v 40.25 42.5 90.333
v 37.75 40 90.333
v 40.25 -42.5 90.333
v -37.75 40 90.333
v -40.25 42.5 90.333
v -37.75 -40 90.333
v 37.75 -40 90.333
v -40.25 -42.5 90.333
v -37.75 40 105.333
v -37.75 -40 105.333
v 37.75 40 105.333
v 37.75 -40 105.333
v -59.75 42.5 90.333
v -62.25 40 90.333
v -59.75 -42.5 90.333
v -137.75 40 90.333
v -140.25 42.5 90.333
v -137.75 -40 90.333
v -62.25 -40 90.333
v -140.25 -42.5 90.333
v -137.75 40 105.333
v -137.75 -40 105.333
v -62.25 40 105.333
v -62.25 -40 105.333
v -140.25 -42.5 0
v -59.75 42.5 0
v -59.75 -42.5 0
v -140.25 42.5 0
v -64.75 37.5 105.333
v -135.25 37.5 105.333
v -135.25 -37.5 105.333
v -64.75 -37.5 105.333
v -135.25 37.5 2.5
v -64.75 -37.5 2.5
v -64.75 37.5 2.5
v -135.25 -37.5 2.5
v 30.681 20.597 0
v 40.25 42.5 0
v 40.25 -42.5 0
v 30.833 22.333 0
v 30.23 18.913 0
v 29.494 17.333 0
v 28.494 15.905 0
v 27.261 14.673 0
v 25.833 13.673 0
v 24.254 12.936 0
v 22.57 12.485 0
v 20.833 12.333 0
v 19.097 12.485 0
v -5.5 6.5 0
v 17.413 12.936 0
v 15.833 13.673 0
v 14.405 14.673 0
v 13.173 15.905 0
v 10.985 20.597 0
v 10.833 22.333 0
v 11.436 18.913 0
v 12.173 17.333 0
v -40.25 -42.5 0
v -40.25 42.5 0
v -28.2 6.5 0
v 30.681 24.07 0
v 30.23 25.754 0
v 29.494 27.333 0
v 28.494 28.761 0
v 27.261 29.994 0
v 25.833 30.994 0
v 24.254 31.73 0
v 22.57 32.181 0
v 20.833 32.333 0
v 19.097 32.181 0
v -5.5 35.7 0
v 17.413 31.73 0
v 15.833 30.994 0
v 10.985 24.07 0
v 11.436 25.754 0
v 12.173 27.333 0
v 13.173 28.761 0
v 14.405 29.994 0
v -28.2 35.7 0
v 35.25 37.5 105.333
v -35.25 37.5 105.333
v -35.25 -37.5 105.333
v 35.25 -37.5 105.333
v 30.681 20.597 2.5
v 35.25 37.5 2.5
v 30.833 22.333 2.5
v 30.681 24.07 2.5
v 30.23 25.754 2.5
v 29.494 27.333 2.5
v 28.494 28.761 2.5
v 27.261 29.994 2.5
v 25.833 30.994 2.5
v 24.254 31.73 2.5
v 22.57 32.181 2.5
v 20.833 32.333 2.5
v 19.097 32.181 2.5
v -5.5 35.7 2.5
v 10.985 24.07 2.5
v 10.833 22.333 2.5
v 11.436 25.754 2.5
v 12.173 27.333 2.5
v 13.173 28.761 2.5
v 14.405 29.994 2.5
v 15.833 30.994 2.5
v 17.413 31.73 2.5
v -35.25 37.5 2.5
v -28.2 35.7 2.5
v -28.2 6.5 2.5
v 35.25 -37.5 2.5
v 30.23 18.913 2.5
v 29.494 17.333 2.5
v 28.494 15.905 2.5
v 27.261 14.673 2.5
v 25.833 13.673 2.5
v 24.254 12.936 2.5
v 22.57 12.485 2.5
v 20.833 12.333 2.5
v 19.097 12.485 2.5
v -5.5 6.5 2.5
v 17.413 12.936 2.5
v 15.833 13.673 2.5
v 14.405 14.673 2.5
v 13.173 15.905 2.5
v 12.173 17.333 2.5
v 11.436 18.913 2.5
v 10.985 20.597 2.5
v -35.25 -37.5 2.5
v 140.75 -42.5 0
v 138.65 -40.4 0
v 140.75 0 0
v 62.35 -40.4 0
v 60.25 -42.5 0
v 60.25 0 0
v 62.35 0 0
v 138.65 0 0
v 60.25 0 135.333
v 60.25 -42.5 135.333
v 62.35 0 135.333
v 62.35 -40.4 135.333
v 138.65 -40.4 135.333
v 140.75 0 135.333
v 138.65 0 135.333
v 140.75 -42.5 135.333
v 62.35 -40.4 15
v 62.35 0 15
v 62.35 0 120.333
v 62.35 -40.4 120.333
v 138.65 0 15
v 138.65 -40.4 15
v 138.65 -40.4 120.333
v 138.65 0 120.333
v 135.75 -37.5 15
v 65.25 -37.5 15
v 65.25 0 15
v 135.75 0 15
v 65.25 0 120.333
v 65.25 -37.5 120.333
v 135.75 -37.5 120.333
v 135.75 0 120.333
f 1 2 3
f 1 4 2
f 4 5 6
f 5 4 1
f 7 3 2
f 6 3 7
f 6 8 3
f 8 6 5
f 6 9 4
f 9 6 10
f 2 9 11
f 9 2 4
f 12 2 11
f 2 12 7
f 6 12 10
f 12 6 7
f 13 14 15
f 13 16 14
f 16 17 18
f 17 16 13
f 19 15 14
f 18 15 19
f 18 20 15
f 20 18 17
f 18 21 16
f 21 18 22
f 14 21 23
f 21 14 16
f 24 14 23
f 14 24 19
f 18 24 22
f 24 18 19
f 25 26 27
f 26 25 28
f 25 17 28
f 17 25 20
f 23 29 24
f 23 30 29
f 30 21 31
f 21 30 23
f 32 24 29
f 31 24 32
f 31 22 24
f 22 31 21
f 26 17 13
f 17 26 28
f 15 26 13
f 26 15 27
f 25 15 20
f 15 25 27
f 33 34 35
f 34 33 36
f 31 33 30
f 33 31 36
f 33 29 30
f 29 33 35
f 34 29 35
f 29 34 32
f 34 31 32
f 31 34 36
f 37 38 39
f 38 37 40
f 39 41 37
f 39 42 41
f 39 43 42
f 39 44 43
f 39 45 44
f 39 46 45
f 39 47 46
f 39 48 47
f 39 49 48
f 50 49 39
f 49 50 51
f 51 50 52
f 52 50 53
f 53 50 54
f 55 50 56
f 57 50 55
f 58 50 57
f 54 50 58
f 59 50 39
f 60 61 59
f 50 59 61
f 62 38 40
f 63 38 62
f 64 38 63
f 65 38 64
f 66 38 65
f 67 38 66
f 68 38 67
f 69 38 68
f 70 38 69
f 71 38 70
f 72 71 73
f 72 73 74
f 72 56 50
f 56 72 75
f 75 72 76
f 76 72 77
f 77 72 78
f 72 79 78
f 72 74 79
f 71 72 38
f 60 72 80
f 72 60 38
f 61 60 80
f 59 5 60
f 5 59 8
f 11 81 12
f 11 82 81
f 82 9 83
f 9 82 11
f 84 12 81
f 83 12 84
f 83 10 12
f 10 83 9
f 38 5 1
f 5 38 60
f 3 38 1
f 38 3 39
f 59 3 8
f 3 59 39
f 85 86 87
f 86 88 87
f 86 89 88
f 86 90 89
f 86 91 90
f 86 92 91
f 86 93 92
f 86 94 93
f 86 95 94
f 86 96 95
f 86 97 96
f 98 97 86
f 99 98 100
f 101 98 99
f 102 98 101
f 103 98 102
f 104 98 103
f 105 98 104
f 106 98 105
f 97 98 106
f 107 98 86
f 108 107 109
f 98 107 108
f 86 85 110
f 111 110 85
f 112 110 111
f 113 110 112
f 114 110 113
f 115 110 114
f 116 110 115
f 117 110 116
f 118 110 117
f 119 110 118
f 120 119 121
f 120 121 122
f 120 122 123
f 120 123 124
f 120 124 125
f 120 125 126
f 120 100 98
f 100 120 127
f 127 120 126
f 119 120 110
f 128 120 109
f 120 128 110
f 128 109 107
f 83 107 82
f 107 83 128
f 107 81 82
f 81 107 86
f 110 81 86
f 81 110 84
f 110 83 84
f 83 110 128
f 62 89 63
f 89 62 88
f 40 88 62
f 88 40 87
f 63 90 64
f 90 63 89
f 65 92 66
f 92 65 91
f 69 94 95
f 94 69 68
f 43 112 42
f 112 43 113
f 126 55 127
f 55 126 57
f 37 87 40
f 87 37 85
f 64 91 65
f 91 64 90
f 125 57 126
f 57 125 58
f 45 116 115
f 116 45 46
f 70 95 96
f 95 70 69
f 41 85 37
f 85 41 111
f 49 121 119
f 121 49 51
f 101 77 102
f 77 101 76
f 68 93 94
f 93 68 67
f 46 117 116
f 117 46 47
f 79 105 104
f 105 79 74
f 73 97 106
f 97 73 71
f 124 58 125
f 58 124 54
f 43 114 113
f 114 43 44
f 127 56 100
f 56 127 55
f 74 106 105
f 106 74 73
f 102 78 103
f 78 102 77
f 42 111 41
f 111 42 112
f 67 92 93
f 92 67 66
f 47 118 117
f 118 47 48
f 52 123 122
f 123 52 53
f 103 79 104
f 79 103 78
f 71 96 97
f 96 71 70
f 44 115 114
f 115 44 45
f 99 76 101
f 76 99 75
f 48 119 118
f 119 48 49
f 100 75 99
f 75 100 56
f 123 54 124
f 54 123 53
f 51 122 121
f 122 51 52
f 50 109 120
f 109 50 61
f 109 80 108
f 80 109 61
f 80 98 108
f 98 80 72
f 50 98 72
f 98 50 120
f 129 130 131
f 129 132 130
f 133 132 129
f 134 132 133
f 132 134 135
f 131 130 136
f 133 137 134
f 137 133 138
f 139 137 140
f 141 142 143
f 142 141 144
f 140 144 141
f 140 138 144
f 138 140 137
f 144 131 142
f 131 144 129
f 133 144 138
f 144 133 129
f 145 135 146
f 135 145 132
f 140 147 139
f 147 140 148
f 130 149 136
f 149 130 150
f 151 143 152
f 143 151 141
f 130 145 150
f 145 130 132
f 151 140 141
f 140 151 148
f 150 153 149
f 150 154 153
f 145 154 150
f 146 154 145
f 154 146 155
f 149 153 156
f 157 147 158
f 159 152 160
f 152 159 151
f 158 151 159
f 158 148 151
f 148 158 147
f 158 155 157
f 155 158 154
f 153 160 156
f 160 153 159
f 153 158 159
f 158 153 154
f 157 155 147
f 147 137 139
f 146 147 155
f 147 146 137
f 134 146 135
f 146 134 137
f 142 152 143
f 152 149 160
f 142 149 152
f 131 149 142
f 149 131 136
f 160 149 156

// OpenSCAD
// file: vars.scad
echo(version=version());
//All dimensions are in mm


wireholddiameter = 20;
switchcutout = [29.2,22.7];
//Perforation size: 23mm*10.5mm
voltmetercutout=[24,11.5];
// Allow for slip by making the ridge a little smaller than the box it fits into.

BatteryHeight=67;
BatteryWidth=62.5;
BatteryDepth=265;
BMCThickness=10;
WiringAllowance=10;
SwitchProtrude=26;
// main file
enableMidBox=true;
enableEndboxWithCutout=true;
enableEndboxNoCutout=true;
interference=0.8;
BatteryPadding=4;
overlap=15;
WallThickness=2.5;

include <vars.scad>;

TotalDepth=BatteryDepth+2*WallThickness+SwitchProtrude+BMCThickness+WiringAllowance;
MidBoxHeight=TotalDepth/3+2*overlap;
EndBoxHeight=TotalDepth/3;


module difstripe() {
  translate ([0,0,EndBoxHeight-overlap])
    difference(){
      linear_extrude(height = overlap+1 )
        square([BatteryWidth+WallThickness*4+BatteryPadding*2+.1,
                BatteryHeight+WallThickness*4+BatteryPadding*2+.1
                ], center = true);
      linear_extrude(height = overlap+2 )
        square([BatteryWidth+WallThickness*2+BatteryPadding*2,
                BatteryHeight+WallThickness*2+BatteryPadding*2
                ], center = true);

    }
}

//EndBox with switch.
module endboxWithCutout(){
  color("red")
    difference() {
      linear_extrude(height = EndBoxHeight )  //outside surface
        square([BatteryWidth+WallThickness*4+
                BatteryPadding*2,
                BatteryHeight+WallThickness*4+
                BatteryPadding*2
                ], center = true);
      translate ([0,0,WallThickness])         //inside surface
        linear_extrude(height = EndBoxHeight)
          square([BatteryWidth+
                  BatteryPadding*2,
                  BatteryHeight+
                  BatteryPadding*2
                  ], center = true)   ;
      translate([BatteryWidth/3,BatteryHeight/3,-0.1])  //hole for wires
        cylinder(h = WallThickness+.2,
                r1 = wireholddiameter/2,
                r2 = wireholddiameter/2,
                $fn = 36,
                center = false);
         // Add the On/Off Switch Cutout
      translate([WallThickness -8 ,WallThickness +4 , -0.1]) //power switch cutout
        rotate([0,0,90])
         linear_extrude(height = WallThickness+.2)
           square(switchcutout, center = false);
      difstripe();                                //inset


      /* // this hole is for a small voltmeter translate([-w+23.5+8*wall,l/2+1,basethickness+6])
      rotate([90,0,0])redMidBoxHeight-overlap*2
          linear_extrude(height = 5)
              square(voltmetercutout,
              centunioner = false); */

     }
}


//EndBox with no cutout.
module endboxNoCutout(){
color("pink")
   difference() {
        linear_extrude(height = EndBoxHeight )
            square([BatteryWidth+WallThickness*4+BatteryPadding*2,
                    BatteryHeight+WallThickness*4+BatteryPadding*2
            ], center = true);
       translate ([0,0,WallThickness])
         linear_extrude(height = EndBoxHeight)
            square([BatteryWidth+BatteryPadding*2,
                    BatteryHeight+BatteryPadding*2
            ], center = true)   ;
        difstripe();

   }
}

//Now do MidBox
module midBox(){
  difference(){
    union(){
      color("orange")  difference(){
          linear_extrude(height=MidBoxHeight)
            square([BatteryWidth+WallThickness*4+BatteryPadding*2,
                    BatteryHeight+WallThickness*4+BatteryPadding*2
              ], center = true);
          translate([0,0,-.1])
          linear_extrude(height = MidBoxHeight+.2)
          square([BatteryWidth+WallThickness*2+BatteryPadding*2+interference,
                  BatteryHeight+WallThickness*2+BatteryPadding*2+interference
                  ], center = true);
      }

      color("yellow") translate([0,0,overlap])
        difference(){
          linear_extrude(height=MidBoxHeight-overlap*2)
            square([BatteryWidth+
                    WallThickness*2+
                    BatteryPadding*2+
                    interference+.1   ,
                    BatteryHeight+
                    WallThickness*2+
                    BatteryPadding*2+
                    interference+.1
              ], center = true);
              translate([0,0,-.1]) linear_extrude(height = MidBoxHeight+.2)
                square([BatteryWidth+BatteryPadding*2,
                        BatteryHeight+BatteryPadding*2
                  ], center = true);
          }
  }
  translate ([-BatteryWidth+WallThickness*2+BatteryPadding*2,0,-.1])
  linear_extrude(height=MidBoxHeight+overlap*2)
    square([2*BatteryWidth+WallThickness*2+BatteryPadding*2+.1,
            BatteryHeight+WallThickness*2+BatteryPadding*2
      ], center = false);


  }
}

if (enableEndboxNoCutout) {
  translate ([-0100,0,0]) endboxNoCutout();
}
if (enableEndboxWithCutout) {
  endboxWithCutout();
}
if (enableMidBox) {
  translate ([100.5,0,0])
  midBox();
}
